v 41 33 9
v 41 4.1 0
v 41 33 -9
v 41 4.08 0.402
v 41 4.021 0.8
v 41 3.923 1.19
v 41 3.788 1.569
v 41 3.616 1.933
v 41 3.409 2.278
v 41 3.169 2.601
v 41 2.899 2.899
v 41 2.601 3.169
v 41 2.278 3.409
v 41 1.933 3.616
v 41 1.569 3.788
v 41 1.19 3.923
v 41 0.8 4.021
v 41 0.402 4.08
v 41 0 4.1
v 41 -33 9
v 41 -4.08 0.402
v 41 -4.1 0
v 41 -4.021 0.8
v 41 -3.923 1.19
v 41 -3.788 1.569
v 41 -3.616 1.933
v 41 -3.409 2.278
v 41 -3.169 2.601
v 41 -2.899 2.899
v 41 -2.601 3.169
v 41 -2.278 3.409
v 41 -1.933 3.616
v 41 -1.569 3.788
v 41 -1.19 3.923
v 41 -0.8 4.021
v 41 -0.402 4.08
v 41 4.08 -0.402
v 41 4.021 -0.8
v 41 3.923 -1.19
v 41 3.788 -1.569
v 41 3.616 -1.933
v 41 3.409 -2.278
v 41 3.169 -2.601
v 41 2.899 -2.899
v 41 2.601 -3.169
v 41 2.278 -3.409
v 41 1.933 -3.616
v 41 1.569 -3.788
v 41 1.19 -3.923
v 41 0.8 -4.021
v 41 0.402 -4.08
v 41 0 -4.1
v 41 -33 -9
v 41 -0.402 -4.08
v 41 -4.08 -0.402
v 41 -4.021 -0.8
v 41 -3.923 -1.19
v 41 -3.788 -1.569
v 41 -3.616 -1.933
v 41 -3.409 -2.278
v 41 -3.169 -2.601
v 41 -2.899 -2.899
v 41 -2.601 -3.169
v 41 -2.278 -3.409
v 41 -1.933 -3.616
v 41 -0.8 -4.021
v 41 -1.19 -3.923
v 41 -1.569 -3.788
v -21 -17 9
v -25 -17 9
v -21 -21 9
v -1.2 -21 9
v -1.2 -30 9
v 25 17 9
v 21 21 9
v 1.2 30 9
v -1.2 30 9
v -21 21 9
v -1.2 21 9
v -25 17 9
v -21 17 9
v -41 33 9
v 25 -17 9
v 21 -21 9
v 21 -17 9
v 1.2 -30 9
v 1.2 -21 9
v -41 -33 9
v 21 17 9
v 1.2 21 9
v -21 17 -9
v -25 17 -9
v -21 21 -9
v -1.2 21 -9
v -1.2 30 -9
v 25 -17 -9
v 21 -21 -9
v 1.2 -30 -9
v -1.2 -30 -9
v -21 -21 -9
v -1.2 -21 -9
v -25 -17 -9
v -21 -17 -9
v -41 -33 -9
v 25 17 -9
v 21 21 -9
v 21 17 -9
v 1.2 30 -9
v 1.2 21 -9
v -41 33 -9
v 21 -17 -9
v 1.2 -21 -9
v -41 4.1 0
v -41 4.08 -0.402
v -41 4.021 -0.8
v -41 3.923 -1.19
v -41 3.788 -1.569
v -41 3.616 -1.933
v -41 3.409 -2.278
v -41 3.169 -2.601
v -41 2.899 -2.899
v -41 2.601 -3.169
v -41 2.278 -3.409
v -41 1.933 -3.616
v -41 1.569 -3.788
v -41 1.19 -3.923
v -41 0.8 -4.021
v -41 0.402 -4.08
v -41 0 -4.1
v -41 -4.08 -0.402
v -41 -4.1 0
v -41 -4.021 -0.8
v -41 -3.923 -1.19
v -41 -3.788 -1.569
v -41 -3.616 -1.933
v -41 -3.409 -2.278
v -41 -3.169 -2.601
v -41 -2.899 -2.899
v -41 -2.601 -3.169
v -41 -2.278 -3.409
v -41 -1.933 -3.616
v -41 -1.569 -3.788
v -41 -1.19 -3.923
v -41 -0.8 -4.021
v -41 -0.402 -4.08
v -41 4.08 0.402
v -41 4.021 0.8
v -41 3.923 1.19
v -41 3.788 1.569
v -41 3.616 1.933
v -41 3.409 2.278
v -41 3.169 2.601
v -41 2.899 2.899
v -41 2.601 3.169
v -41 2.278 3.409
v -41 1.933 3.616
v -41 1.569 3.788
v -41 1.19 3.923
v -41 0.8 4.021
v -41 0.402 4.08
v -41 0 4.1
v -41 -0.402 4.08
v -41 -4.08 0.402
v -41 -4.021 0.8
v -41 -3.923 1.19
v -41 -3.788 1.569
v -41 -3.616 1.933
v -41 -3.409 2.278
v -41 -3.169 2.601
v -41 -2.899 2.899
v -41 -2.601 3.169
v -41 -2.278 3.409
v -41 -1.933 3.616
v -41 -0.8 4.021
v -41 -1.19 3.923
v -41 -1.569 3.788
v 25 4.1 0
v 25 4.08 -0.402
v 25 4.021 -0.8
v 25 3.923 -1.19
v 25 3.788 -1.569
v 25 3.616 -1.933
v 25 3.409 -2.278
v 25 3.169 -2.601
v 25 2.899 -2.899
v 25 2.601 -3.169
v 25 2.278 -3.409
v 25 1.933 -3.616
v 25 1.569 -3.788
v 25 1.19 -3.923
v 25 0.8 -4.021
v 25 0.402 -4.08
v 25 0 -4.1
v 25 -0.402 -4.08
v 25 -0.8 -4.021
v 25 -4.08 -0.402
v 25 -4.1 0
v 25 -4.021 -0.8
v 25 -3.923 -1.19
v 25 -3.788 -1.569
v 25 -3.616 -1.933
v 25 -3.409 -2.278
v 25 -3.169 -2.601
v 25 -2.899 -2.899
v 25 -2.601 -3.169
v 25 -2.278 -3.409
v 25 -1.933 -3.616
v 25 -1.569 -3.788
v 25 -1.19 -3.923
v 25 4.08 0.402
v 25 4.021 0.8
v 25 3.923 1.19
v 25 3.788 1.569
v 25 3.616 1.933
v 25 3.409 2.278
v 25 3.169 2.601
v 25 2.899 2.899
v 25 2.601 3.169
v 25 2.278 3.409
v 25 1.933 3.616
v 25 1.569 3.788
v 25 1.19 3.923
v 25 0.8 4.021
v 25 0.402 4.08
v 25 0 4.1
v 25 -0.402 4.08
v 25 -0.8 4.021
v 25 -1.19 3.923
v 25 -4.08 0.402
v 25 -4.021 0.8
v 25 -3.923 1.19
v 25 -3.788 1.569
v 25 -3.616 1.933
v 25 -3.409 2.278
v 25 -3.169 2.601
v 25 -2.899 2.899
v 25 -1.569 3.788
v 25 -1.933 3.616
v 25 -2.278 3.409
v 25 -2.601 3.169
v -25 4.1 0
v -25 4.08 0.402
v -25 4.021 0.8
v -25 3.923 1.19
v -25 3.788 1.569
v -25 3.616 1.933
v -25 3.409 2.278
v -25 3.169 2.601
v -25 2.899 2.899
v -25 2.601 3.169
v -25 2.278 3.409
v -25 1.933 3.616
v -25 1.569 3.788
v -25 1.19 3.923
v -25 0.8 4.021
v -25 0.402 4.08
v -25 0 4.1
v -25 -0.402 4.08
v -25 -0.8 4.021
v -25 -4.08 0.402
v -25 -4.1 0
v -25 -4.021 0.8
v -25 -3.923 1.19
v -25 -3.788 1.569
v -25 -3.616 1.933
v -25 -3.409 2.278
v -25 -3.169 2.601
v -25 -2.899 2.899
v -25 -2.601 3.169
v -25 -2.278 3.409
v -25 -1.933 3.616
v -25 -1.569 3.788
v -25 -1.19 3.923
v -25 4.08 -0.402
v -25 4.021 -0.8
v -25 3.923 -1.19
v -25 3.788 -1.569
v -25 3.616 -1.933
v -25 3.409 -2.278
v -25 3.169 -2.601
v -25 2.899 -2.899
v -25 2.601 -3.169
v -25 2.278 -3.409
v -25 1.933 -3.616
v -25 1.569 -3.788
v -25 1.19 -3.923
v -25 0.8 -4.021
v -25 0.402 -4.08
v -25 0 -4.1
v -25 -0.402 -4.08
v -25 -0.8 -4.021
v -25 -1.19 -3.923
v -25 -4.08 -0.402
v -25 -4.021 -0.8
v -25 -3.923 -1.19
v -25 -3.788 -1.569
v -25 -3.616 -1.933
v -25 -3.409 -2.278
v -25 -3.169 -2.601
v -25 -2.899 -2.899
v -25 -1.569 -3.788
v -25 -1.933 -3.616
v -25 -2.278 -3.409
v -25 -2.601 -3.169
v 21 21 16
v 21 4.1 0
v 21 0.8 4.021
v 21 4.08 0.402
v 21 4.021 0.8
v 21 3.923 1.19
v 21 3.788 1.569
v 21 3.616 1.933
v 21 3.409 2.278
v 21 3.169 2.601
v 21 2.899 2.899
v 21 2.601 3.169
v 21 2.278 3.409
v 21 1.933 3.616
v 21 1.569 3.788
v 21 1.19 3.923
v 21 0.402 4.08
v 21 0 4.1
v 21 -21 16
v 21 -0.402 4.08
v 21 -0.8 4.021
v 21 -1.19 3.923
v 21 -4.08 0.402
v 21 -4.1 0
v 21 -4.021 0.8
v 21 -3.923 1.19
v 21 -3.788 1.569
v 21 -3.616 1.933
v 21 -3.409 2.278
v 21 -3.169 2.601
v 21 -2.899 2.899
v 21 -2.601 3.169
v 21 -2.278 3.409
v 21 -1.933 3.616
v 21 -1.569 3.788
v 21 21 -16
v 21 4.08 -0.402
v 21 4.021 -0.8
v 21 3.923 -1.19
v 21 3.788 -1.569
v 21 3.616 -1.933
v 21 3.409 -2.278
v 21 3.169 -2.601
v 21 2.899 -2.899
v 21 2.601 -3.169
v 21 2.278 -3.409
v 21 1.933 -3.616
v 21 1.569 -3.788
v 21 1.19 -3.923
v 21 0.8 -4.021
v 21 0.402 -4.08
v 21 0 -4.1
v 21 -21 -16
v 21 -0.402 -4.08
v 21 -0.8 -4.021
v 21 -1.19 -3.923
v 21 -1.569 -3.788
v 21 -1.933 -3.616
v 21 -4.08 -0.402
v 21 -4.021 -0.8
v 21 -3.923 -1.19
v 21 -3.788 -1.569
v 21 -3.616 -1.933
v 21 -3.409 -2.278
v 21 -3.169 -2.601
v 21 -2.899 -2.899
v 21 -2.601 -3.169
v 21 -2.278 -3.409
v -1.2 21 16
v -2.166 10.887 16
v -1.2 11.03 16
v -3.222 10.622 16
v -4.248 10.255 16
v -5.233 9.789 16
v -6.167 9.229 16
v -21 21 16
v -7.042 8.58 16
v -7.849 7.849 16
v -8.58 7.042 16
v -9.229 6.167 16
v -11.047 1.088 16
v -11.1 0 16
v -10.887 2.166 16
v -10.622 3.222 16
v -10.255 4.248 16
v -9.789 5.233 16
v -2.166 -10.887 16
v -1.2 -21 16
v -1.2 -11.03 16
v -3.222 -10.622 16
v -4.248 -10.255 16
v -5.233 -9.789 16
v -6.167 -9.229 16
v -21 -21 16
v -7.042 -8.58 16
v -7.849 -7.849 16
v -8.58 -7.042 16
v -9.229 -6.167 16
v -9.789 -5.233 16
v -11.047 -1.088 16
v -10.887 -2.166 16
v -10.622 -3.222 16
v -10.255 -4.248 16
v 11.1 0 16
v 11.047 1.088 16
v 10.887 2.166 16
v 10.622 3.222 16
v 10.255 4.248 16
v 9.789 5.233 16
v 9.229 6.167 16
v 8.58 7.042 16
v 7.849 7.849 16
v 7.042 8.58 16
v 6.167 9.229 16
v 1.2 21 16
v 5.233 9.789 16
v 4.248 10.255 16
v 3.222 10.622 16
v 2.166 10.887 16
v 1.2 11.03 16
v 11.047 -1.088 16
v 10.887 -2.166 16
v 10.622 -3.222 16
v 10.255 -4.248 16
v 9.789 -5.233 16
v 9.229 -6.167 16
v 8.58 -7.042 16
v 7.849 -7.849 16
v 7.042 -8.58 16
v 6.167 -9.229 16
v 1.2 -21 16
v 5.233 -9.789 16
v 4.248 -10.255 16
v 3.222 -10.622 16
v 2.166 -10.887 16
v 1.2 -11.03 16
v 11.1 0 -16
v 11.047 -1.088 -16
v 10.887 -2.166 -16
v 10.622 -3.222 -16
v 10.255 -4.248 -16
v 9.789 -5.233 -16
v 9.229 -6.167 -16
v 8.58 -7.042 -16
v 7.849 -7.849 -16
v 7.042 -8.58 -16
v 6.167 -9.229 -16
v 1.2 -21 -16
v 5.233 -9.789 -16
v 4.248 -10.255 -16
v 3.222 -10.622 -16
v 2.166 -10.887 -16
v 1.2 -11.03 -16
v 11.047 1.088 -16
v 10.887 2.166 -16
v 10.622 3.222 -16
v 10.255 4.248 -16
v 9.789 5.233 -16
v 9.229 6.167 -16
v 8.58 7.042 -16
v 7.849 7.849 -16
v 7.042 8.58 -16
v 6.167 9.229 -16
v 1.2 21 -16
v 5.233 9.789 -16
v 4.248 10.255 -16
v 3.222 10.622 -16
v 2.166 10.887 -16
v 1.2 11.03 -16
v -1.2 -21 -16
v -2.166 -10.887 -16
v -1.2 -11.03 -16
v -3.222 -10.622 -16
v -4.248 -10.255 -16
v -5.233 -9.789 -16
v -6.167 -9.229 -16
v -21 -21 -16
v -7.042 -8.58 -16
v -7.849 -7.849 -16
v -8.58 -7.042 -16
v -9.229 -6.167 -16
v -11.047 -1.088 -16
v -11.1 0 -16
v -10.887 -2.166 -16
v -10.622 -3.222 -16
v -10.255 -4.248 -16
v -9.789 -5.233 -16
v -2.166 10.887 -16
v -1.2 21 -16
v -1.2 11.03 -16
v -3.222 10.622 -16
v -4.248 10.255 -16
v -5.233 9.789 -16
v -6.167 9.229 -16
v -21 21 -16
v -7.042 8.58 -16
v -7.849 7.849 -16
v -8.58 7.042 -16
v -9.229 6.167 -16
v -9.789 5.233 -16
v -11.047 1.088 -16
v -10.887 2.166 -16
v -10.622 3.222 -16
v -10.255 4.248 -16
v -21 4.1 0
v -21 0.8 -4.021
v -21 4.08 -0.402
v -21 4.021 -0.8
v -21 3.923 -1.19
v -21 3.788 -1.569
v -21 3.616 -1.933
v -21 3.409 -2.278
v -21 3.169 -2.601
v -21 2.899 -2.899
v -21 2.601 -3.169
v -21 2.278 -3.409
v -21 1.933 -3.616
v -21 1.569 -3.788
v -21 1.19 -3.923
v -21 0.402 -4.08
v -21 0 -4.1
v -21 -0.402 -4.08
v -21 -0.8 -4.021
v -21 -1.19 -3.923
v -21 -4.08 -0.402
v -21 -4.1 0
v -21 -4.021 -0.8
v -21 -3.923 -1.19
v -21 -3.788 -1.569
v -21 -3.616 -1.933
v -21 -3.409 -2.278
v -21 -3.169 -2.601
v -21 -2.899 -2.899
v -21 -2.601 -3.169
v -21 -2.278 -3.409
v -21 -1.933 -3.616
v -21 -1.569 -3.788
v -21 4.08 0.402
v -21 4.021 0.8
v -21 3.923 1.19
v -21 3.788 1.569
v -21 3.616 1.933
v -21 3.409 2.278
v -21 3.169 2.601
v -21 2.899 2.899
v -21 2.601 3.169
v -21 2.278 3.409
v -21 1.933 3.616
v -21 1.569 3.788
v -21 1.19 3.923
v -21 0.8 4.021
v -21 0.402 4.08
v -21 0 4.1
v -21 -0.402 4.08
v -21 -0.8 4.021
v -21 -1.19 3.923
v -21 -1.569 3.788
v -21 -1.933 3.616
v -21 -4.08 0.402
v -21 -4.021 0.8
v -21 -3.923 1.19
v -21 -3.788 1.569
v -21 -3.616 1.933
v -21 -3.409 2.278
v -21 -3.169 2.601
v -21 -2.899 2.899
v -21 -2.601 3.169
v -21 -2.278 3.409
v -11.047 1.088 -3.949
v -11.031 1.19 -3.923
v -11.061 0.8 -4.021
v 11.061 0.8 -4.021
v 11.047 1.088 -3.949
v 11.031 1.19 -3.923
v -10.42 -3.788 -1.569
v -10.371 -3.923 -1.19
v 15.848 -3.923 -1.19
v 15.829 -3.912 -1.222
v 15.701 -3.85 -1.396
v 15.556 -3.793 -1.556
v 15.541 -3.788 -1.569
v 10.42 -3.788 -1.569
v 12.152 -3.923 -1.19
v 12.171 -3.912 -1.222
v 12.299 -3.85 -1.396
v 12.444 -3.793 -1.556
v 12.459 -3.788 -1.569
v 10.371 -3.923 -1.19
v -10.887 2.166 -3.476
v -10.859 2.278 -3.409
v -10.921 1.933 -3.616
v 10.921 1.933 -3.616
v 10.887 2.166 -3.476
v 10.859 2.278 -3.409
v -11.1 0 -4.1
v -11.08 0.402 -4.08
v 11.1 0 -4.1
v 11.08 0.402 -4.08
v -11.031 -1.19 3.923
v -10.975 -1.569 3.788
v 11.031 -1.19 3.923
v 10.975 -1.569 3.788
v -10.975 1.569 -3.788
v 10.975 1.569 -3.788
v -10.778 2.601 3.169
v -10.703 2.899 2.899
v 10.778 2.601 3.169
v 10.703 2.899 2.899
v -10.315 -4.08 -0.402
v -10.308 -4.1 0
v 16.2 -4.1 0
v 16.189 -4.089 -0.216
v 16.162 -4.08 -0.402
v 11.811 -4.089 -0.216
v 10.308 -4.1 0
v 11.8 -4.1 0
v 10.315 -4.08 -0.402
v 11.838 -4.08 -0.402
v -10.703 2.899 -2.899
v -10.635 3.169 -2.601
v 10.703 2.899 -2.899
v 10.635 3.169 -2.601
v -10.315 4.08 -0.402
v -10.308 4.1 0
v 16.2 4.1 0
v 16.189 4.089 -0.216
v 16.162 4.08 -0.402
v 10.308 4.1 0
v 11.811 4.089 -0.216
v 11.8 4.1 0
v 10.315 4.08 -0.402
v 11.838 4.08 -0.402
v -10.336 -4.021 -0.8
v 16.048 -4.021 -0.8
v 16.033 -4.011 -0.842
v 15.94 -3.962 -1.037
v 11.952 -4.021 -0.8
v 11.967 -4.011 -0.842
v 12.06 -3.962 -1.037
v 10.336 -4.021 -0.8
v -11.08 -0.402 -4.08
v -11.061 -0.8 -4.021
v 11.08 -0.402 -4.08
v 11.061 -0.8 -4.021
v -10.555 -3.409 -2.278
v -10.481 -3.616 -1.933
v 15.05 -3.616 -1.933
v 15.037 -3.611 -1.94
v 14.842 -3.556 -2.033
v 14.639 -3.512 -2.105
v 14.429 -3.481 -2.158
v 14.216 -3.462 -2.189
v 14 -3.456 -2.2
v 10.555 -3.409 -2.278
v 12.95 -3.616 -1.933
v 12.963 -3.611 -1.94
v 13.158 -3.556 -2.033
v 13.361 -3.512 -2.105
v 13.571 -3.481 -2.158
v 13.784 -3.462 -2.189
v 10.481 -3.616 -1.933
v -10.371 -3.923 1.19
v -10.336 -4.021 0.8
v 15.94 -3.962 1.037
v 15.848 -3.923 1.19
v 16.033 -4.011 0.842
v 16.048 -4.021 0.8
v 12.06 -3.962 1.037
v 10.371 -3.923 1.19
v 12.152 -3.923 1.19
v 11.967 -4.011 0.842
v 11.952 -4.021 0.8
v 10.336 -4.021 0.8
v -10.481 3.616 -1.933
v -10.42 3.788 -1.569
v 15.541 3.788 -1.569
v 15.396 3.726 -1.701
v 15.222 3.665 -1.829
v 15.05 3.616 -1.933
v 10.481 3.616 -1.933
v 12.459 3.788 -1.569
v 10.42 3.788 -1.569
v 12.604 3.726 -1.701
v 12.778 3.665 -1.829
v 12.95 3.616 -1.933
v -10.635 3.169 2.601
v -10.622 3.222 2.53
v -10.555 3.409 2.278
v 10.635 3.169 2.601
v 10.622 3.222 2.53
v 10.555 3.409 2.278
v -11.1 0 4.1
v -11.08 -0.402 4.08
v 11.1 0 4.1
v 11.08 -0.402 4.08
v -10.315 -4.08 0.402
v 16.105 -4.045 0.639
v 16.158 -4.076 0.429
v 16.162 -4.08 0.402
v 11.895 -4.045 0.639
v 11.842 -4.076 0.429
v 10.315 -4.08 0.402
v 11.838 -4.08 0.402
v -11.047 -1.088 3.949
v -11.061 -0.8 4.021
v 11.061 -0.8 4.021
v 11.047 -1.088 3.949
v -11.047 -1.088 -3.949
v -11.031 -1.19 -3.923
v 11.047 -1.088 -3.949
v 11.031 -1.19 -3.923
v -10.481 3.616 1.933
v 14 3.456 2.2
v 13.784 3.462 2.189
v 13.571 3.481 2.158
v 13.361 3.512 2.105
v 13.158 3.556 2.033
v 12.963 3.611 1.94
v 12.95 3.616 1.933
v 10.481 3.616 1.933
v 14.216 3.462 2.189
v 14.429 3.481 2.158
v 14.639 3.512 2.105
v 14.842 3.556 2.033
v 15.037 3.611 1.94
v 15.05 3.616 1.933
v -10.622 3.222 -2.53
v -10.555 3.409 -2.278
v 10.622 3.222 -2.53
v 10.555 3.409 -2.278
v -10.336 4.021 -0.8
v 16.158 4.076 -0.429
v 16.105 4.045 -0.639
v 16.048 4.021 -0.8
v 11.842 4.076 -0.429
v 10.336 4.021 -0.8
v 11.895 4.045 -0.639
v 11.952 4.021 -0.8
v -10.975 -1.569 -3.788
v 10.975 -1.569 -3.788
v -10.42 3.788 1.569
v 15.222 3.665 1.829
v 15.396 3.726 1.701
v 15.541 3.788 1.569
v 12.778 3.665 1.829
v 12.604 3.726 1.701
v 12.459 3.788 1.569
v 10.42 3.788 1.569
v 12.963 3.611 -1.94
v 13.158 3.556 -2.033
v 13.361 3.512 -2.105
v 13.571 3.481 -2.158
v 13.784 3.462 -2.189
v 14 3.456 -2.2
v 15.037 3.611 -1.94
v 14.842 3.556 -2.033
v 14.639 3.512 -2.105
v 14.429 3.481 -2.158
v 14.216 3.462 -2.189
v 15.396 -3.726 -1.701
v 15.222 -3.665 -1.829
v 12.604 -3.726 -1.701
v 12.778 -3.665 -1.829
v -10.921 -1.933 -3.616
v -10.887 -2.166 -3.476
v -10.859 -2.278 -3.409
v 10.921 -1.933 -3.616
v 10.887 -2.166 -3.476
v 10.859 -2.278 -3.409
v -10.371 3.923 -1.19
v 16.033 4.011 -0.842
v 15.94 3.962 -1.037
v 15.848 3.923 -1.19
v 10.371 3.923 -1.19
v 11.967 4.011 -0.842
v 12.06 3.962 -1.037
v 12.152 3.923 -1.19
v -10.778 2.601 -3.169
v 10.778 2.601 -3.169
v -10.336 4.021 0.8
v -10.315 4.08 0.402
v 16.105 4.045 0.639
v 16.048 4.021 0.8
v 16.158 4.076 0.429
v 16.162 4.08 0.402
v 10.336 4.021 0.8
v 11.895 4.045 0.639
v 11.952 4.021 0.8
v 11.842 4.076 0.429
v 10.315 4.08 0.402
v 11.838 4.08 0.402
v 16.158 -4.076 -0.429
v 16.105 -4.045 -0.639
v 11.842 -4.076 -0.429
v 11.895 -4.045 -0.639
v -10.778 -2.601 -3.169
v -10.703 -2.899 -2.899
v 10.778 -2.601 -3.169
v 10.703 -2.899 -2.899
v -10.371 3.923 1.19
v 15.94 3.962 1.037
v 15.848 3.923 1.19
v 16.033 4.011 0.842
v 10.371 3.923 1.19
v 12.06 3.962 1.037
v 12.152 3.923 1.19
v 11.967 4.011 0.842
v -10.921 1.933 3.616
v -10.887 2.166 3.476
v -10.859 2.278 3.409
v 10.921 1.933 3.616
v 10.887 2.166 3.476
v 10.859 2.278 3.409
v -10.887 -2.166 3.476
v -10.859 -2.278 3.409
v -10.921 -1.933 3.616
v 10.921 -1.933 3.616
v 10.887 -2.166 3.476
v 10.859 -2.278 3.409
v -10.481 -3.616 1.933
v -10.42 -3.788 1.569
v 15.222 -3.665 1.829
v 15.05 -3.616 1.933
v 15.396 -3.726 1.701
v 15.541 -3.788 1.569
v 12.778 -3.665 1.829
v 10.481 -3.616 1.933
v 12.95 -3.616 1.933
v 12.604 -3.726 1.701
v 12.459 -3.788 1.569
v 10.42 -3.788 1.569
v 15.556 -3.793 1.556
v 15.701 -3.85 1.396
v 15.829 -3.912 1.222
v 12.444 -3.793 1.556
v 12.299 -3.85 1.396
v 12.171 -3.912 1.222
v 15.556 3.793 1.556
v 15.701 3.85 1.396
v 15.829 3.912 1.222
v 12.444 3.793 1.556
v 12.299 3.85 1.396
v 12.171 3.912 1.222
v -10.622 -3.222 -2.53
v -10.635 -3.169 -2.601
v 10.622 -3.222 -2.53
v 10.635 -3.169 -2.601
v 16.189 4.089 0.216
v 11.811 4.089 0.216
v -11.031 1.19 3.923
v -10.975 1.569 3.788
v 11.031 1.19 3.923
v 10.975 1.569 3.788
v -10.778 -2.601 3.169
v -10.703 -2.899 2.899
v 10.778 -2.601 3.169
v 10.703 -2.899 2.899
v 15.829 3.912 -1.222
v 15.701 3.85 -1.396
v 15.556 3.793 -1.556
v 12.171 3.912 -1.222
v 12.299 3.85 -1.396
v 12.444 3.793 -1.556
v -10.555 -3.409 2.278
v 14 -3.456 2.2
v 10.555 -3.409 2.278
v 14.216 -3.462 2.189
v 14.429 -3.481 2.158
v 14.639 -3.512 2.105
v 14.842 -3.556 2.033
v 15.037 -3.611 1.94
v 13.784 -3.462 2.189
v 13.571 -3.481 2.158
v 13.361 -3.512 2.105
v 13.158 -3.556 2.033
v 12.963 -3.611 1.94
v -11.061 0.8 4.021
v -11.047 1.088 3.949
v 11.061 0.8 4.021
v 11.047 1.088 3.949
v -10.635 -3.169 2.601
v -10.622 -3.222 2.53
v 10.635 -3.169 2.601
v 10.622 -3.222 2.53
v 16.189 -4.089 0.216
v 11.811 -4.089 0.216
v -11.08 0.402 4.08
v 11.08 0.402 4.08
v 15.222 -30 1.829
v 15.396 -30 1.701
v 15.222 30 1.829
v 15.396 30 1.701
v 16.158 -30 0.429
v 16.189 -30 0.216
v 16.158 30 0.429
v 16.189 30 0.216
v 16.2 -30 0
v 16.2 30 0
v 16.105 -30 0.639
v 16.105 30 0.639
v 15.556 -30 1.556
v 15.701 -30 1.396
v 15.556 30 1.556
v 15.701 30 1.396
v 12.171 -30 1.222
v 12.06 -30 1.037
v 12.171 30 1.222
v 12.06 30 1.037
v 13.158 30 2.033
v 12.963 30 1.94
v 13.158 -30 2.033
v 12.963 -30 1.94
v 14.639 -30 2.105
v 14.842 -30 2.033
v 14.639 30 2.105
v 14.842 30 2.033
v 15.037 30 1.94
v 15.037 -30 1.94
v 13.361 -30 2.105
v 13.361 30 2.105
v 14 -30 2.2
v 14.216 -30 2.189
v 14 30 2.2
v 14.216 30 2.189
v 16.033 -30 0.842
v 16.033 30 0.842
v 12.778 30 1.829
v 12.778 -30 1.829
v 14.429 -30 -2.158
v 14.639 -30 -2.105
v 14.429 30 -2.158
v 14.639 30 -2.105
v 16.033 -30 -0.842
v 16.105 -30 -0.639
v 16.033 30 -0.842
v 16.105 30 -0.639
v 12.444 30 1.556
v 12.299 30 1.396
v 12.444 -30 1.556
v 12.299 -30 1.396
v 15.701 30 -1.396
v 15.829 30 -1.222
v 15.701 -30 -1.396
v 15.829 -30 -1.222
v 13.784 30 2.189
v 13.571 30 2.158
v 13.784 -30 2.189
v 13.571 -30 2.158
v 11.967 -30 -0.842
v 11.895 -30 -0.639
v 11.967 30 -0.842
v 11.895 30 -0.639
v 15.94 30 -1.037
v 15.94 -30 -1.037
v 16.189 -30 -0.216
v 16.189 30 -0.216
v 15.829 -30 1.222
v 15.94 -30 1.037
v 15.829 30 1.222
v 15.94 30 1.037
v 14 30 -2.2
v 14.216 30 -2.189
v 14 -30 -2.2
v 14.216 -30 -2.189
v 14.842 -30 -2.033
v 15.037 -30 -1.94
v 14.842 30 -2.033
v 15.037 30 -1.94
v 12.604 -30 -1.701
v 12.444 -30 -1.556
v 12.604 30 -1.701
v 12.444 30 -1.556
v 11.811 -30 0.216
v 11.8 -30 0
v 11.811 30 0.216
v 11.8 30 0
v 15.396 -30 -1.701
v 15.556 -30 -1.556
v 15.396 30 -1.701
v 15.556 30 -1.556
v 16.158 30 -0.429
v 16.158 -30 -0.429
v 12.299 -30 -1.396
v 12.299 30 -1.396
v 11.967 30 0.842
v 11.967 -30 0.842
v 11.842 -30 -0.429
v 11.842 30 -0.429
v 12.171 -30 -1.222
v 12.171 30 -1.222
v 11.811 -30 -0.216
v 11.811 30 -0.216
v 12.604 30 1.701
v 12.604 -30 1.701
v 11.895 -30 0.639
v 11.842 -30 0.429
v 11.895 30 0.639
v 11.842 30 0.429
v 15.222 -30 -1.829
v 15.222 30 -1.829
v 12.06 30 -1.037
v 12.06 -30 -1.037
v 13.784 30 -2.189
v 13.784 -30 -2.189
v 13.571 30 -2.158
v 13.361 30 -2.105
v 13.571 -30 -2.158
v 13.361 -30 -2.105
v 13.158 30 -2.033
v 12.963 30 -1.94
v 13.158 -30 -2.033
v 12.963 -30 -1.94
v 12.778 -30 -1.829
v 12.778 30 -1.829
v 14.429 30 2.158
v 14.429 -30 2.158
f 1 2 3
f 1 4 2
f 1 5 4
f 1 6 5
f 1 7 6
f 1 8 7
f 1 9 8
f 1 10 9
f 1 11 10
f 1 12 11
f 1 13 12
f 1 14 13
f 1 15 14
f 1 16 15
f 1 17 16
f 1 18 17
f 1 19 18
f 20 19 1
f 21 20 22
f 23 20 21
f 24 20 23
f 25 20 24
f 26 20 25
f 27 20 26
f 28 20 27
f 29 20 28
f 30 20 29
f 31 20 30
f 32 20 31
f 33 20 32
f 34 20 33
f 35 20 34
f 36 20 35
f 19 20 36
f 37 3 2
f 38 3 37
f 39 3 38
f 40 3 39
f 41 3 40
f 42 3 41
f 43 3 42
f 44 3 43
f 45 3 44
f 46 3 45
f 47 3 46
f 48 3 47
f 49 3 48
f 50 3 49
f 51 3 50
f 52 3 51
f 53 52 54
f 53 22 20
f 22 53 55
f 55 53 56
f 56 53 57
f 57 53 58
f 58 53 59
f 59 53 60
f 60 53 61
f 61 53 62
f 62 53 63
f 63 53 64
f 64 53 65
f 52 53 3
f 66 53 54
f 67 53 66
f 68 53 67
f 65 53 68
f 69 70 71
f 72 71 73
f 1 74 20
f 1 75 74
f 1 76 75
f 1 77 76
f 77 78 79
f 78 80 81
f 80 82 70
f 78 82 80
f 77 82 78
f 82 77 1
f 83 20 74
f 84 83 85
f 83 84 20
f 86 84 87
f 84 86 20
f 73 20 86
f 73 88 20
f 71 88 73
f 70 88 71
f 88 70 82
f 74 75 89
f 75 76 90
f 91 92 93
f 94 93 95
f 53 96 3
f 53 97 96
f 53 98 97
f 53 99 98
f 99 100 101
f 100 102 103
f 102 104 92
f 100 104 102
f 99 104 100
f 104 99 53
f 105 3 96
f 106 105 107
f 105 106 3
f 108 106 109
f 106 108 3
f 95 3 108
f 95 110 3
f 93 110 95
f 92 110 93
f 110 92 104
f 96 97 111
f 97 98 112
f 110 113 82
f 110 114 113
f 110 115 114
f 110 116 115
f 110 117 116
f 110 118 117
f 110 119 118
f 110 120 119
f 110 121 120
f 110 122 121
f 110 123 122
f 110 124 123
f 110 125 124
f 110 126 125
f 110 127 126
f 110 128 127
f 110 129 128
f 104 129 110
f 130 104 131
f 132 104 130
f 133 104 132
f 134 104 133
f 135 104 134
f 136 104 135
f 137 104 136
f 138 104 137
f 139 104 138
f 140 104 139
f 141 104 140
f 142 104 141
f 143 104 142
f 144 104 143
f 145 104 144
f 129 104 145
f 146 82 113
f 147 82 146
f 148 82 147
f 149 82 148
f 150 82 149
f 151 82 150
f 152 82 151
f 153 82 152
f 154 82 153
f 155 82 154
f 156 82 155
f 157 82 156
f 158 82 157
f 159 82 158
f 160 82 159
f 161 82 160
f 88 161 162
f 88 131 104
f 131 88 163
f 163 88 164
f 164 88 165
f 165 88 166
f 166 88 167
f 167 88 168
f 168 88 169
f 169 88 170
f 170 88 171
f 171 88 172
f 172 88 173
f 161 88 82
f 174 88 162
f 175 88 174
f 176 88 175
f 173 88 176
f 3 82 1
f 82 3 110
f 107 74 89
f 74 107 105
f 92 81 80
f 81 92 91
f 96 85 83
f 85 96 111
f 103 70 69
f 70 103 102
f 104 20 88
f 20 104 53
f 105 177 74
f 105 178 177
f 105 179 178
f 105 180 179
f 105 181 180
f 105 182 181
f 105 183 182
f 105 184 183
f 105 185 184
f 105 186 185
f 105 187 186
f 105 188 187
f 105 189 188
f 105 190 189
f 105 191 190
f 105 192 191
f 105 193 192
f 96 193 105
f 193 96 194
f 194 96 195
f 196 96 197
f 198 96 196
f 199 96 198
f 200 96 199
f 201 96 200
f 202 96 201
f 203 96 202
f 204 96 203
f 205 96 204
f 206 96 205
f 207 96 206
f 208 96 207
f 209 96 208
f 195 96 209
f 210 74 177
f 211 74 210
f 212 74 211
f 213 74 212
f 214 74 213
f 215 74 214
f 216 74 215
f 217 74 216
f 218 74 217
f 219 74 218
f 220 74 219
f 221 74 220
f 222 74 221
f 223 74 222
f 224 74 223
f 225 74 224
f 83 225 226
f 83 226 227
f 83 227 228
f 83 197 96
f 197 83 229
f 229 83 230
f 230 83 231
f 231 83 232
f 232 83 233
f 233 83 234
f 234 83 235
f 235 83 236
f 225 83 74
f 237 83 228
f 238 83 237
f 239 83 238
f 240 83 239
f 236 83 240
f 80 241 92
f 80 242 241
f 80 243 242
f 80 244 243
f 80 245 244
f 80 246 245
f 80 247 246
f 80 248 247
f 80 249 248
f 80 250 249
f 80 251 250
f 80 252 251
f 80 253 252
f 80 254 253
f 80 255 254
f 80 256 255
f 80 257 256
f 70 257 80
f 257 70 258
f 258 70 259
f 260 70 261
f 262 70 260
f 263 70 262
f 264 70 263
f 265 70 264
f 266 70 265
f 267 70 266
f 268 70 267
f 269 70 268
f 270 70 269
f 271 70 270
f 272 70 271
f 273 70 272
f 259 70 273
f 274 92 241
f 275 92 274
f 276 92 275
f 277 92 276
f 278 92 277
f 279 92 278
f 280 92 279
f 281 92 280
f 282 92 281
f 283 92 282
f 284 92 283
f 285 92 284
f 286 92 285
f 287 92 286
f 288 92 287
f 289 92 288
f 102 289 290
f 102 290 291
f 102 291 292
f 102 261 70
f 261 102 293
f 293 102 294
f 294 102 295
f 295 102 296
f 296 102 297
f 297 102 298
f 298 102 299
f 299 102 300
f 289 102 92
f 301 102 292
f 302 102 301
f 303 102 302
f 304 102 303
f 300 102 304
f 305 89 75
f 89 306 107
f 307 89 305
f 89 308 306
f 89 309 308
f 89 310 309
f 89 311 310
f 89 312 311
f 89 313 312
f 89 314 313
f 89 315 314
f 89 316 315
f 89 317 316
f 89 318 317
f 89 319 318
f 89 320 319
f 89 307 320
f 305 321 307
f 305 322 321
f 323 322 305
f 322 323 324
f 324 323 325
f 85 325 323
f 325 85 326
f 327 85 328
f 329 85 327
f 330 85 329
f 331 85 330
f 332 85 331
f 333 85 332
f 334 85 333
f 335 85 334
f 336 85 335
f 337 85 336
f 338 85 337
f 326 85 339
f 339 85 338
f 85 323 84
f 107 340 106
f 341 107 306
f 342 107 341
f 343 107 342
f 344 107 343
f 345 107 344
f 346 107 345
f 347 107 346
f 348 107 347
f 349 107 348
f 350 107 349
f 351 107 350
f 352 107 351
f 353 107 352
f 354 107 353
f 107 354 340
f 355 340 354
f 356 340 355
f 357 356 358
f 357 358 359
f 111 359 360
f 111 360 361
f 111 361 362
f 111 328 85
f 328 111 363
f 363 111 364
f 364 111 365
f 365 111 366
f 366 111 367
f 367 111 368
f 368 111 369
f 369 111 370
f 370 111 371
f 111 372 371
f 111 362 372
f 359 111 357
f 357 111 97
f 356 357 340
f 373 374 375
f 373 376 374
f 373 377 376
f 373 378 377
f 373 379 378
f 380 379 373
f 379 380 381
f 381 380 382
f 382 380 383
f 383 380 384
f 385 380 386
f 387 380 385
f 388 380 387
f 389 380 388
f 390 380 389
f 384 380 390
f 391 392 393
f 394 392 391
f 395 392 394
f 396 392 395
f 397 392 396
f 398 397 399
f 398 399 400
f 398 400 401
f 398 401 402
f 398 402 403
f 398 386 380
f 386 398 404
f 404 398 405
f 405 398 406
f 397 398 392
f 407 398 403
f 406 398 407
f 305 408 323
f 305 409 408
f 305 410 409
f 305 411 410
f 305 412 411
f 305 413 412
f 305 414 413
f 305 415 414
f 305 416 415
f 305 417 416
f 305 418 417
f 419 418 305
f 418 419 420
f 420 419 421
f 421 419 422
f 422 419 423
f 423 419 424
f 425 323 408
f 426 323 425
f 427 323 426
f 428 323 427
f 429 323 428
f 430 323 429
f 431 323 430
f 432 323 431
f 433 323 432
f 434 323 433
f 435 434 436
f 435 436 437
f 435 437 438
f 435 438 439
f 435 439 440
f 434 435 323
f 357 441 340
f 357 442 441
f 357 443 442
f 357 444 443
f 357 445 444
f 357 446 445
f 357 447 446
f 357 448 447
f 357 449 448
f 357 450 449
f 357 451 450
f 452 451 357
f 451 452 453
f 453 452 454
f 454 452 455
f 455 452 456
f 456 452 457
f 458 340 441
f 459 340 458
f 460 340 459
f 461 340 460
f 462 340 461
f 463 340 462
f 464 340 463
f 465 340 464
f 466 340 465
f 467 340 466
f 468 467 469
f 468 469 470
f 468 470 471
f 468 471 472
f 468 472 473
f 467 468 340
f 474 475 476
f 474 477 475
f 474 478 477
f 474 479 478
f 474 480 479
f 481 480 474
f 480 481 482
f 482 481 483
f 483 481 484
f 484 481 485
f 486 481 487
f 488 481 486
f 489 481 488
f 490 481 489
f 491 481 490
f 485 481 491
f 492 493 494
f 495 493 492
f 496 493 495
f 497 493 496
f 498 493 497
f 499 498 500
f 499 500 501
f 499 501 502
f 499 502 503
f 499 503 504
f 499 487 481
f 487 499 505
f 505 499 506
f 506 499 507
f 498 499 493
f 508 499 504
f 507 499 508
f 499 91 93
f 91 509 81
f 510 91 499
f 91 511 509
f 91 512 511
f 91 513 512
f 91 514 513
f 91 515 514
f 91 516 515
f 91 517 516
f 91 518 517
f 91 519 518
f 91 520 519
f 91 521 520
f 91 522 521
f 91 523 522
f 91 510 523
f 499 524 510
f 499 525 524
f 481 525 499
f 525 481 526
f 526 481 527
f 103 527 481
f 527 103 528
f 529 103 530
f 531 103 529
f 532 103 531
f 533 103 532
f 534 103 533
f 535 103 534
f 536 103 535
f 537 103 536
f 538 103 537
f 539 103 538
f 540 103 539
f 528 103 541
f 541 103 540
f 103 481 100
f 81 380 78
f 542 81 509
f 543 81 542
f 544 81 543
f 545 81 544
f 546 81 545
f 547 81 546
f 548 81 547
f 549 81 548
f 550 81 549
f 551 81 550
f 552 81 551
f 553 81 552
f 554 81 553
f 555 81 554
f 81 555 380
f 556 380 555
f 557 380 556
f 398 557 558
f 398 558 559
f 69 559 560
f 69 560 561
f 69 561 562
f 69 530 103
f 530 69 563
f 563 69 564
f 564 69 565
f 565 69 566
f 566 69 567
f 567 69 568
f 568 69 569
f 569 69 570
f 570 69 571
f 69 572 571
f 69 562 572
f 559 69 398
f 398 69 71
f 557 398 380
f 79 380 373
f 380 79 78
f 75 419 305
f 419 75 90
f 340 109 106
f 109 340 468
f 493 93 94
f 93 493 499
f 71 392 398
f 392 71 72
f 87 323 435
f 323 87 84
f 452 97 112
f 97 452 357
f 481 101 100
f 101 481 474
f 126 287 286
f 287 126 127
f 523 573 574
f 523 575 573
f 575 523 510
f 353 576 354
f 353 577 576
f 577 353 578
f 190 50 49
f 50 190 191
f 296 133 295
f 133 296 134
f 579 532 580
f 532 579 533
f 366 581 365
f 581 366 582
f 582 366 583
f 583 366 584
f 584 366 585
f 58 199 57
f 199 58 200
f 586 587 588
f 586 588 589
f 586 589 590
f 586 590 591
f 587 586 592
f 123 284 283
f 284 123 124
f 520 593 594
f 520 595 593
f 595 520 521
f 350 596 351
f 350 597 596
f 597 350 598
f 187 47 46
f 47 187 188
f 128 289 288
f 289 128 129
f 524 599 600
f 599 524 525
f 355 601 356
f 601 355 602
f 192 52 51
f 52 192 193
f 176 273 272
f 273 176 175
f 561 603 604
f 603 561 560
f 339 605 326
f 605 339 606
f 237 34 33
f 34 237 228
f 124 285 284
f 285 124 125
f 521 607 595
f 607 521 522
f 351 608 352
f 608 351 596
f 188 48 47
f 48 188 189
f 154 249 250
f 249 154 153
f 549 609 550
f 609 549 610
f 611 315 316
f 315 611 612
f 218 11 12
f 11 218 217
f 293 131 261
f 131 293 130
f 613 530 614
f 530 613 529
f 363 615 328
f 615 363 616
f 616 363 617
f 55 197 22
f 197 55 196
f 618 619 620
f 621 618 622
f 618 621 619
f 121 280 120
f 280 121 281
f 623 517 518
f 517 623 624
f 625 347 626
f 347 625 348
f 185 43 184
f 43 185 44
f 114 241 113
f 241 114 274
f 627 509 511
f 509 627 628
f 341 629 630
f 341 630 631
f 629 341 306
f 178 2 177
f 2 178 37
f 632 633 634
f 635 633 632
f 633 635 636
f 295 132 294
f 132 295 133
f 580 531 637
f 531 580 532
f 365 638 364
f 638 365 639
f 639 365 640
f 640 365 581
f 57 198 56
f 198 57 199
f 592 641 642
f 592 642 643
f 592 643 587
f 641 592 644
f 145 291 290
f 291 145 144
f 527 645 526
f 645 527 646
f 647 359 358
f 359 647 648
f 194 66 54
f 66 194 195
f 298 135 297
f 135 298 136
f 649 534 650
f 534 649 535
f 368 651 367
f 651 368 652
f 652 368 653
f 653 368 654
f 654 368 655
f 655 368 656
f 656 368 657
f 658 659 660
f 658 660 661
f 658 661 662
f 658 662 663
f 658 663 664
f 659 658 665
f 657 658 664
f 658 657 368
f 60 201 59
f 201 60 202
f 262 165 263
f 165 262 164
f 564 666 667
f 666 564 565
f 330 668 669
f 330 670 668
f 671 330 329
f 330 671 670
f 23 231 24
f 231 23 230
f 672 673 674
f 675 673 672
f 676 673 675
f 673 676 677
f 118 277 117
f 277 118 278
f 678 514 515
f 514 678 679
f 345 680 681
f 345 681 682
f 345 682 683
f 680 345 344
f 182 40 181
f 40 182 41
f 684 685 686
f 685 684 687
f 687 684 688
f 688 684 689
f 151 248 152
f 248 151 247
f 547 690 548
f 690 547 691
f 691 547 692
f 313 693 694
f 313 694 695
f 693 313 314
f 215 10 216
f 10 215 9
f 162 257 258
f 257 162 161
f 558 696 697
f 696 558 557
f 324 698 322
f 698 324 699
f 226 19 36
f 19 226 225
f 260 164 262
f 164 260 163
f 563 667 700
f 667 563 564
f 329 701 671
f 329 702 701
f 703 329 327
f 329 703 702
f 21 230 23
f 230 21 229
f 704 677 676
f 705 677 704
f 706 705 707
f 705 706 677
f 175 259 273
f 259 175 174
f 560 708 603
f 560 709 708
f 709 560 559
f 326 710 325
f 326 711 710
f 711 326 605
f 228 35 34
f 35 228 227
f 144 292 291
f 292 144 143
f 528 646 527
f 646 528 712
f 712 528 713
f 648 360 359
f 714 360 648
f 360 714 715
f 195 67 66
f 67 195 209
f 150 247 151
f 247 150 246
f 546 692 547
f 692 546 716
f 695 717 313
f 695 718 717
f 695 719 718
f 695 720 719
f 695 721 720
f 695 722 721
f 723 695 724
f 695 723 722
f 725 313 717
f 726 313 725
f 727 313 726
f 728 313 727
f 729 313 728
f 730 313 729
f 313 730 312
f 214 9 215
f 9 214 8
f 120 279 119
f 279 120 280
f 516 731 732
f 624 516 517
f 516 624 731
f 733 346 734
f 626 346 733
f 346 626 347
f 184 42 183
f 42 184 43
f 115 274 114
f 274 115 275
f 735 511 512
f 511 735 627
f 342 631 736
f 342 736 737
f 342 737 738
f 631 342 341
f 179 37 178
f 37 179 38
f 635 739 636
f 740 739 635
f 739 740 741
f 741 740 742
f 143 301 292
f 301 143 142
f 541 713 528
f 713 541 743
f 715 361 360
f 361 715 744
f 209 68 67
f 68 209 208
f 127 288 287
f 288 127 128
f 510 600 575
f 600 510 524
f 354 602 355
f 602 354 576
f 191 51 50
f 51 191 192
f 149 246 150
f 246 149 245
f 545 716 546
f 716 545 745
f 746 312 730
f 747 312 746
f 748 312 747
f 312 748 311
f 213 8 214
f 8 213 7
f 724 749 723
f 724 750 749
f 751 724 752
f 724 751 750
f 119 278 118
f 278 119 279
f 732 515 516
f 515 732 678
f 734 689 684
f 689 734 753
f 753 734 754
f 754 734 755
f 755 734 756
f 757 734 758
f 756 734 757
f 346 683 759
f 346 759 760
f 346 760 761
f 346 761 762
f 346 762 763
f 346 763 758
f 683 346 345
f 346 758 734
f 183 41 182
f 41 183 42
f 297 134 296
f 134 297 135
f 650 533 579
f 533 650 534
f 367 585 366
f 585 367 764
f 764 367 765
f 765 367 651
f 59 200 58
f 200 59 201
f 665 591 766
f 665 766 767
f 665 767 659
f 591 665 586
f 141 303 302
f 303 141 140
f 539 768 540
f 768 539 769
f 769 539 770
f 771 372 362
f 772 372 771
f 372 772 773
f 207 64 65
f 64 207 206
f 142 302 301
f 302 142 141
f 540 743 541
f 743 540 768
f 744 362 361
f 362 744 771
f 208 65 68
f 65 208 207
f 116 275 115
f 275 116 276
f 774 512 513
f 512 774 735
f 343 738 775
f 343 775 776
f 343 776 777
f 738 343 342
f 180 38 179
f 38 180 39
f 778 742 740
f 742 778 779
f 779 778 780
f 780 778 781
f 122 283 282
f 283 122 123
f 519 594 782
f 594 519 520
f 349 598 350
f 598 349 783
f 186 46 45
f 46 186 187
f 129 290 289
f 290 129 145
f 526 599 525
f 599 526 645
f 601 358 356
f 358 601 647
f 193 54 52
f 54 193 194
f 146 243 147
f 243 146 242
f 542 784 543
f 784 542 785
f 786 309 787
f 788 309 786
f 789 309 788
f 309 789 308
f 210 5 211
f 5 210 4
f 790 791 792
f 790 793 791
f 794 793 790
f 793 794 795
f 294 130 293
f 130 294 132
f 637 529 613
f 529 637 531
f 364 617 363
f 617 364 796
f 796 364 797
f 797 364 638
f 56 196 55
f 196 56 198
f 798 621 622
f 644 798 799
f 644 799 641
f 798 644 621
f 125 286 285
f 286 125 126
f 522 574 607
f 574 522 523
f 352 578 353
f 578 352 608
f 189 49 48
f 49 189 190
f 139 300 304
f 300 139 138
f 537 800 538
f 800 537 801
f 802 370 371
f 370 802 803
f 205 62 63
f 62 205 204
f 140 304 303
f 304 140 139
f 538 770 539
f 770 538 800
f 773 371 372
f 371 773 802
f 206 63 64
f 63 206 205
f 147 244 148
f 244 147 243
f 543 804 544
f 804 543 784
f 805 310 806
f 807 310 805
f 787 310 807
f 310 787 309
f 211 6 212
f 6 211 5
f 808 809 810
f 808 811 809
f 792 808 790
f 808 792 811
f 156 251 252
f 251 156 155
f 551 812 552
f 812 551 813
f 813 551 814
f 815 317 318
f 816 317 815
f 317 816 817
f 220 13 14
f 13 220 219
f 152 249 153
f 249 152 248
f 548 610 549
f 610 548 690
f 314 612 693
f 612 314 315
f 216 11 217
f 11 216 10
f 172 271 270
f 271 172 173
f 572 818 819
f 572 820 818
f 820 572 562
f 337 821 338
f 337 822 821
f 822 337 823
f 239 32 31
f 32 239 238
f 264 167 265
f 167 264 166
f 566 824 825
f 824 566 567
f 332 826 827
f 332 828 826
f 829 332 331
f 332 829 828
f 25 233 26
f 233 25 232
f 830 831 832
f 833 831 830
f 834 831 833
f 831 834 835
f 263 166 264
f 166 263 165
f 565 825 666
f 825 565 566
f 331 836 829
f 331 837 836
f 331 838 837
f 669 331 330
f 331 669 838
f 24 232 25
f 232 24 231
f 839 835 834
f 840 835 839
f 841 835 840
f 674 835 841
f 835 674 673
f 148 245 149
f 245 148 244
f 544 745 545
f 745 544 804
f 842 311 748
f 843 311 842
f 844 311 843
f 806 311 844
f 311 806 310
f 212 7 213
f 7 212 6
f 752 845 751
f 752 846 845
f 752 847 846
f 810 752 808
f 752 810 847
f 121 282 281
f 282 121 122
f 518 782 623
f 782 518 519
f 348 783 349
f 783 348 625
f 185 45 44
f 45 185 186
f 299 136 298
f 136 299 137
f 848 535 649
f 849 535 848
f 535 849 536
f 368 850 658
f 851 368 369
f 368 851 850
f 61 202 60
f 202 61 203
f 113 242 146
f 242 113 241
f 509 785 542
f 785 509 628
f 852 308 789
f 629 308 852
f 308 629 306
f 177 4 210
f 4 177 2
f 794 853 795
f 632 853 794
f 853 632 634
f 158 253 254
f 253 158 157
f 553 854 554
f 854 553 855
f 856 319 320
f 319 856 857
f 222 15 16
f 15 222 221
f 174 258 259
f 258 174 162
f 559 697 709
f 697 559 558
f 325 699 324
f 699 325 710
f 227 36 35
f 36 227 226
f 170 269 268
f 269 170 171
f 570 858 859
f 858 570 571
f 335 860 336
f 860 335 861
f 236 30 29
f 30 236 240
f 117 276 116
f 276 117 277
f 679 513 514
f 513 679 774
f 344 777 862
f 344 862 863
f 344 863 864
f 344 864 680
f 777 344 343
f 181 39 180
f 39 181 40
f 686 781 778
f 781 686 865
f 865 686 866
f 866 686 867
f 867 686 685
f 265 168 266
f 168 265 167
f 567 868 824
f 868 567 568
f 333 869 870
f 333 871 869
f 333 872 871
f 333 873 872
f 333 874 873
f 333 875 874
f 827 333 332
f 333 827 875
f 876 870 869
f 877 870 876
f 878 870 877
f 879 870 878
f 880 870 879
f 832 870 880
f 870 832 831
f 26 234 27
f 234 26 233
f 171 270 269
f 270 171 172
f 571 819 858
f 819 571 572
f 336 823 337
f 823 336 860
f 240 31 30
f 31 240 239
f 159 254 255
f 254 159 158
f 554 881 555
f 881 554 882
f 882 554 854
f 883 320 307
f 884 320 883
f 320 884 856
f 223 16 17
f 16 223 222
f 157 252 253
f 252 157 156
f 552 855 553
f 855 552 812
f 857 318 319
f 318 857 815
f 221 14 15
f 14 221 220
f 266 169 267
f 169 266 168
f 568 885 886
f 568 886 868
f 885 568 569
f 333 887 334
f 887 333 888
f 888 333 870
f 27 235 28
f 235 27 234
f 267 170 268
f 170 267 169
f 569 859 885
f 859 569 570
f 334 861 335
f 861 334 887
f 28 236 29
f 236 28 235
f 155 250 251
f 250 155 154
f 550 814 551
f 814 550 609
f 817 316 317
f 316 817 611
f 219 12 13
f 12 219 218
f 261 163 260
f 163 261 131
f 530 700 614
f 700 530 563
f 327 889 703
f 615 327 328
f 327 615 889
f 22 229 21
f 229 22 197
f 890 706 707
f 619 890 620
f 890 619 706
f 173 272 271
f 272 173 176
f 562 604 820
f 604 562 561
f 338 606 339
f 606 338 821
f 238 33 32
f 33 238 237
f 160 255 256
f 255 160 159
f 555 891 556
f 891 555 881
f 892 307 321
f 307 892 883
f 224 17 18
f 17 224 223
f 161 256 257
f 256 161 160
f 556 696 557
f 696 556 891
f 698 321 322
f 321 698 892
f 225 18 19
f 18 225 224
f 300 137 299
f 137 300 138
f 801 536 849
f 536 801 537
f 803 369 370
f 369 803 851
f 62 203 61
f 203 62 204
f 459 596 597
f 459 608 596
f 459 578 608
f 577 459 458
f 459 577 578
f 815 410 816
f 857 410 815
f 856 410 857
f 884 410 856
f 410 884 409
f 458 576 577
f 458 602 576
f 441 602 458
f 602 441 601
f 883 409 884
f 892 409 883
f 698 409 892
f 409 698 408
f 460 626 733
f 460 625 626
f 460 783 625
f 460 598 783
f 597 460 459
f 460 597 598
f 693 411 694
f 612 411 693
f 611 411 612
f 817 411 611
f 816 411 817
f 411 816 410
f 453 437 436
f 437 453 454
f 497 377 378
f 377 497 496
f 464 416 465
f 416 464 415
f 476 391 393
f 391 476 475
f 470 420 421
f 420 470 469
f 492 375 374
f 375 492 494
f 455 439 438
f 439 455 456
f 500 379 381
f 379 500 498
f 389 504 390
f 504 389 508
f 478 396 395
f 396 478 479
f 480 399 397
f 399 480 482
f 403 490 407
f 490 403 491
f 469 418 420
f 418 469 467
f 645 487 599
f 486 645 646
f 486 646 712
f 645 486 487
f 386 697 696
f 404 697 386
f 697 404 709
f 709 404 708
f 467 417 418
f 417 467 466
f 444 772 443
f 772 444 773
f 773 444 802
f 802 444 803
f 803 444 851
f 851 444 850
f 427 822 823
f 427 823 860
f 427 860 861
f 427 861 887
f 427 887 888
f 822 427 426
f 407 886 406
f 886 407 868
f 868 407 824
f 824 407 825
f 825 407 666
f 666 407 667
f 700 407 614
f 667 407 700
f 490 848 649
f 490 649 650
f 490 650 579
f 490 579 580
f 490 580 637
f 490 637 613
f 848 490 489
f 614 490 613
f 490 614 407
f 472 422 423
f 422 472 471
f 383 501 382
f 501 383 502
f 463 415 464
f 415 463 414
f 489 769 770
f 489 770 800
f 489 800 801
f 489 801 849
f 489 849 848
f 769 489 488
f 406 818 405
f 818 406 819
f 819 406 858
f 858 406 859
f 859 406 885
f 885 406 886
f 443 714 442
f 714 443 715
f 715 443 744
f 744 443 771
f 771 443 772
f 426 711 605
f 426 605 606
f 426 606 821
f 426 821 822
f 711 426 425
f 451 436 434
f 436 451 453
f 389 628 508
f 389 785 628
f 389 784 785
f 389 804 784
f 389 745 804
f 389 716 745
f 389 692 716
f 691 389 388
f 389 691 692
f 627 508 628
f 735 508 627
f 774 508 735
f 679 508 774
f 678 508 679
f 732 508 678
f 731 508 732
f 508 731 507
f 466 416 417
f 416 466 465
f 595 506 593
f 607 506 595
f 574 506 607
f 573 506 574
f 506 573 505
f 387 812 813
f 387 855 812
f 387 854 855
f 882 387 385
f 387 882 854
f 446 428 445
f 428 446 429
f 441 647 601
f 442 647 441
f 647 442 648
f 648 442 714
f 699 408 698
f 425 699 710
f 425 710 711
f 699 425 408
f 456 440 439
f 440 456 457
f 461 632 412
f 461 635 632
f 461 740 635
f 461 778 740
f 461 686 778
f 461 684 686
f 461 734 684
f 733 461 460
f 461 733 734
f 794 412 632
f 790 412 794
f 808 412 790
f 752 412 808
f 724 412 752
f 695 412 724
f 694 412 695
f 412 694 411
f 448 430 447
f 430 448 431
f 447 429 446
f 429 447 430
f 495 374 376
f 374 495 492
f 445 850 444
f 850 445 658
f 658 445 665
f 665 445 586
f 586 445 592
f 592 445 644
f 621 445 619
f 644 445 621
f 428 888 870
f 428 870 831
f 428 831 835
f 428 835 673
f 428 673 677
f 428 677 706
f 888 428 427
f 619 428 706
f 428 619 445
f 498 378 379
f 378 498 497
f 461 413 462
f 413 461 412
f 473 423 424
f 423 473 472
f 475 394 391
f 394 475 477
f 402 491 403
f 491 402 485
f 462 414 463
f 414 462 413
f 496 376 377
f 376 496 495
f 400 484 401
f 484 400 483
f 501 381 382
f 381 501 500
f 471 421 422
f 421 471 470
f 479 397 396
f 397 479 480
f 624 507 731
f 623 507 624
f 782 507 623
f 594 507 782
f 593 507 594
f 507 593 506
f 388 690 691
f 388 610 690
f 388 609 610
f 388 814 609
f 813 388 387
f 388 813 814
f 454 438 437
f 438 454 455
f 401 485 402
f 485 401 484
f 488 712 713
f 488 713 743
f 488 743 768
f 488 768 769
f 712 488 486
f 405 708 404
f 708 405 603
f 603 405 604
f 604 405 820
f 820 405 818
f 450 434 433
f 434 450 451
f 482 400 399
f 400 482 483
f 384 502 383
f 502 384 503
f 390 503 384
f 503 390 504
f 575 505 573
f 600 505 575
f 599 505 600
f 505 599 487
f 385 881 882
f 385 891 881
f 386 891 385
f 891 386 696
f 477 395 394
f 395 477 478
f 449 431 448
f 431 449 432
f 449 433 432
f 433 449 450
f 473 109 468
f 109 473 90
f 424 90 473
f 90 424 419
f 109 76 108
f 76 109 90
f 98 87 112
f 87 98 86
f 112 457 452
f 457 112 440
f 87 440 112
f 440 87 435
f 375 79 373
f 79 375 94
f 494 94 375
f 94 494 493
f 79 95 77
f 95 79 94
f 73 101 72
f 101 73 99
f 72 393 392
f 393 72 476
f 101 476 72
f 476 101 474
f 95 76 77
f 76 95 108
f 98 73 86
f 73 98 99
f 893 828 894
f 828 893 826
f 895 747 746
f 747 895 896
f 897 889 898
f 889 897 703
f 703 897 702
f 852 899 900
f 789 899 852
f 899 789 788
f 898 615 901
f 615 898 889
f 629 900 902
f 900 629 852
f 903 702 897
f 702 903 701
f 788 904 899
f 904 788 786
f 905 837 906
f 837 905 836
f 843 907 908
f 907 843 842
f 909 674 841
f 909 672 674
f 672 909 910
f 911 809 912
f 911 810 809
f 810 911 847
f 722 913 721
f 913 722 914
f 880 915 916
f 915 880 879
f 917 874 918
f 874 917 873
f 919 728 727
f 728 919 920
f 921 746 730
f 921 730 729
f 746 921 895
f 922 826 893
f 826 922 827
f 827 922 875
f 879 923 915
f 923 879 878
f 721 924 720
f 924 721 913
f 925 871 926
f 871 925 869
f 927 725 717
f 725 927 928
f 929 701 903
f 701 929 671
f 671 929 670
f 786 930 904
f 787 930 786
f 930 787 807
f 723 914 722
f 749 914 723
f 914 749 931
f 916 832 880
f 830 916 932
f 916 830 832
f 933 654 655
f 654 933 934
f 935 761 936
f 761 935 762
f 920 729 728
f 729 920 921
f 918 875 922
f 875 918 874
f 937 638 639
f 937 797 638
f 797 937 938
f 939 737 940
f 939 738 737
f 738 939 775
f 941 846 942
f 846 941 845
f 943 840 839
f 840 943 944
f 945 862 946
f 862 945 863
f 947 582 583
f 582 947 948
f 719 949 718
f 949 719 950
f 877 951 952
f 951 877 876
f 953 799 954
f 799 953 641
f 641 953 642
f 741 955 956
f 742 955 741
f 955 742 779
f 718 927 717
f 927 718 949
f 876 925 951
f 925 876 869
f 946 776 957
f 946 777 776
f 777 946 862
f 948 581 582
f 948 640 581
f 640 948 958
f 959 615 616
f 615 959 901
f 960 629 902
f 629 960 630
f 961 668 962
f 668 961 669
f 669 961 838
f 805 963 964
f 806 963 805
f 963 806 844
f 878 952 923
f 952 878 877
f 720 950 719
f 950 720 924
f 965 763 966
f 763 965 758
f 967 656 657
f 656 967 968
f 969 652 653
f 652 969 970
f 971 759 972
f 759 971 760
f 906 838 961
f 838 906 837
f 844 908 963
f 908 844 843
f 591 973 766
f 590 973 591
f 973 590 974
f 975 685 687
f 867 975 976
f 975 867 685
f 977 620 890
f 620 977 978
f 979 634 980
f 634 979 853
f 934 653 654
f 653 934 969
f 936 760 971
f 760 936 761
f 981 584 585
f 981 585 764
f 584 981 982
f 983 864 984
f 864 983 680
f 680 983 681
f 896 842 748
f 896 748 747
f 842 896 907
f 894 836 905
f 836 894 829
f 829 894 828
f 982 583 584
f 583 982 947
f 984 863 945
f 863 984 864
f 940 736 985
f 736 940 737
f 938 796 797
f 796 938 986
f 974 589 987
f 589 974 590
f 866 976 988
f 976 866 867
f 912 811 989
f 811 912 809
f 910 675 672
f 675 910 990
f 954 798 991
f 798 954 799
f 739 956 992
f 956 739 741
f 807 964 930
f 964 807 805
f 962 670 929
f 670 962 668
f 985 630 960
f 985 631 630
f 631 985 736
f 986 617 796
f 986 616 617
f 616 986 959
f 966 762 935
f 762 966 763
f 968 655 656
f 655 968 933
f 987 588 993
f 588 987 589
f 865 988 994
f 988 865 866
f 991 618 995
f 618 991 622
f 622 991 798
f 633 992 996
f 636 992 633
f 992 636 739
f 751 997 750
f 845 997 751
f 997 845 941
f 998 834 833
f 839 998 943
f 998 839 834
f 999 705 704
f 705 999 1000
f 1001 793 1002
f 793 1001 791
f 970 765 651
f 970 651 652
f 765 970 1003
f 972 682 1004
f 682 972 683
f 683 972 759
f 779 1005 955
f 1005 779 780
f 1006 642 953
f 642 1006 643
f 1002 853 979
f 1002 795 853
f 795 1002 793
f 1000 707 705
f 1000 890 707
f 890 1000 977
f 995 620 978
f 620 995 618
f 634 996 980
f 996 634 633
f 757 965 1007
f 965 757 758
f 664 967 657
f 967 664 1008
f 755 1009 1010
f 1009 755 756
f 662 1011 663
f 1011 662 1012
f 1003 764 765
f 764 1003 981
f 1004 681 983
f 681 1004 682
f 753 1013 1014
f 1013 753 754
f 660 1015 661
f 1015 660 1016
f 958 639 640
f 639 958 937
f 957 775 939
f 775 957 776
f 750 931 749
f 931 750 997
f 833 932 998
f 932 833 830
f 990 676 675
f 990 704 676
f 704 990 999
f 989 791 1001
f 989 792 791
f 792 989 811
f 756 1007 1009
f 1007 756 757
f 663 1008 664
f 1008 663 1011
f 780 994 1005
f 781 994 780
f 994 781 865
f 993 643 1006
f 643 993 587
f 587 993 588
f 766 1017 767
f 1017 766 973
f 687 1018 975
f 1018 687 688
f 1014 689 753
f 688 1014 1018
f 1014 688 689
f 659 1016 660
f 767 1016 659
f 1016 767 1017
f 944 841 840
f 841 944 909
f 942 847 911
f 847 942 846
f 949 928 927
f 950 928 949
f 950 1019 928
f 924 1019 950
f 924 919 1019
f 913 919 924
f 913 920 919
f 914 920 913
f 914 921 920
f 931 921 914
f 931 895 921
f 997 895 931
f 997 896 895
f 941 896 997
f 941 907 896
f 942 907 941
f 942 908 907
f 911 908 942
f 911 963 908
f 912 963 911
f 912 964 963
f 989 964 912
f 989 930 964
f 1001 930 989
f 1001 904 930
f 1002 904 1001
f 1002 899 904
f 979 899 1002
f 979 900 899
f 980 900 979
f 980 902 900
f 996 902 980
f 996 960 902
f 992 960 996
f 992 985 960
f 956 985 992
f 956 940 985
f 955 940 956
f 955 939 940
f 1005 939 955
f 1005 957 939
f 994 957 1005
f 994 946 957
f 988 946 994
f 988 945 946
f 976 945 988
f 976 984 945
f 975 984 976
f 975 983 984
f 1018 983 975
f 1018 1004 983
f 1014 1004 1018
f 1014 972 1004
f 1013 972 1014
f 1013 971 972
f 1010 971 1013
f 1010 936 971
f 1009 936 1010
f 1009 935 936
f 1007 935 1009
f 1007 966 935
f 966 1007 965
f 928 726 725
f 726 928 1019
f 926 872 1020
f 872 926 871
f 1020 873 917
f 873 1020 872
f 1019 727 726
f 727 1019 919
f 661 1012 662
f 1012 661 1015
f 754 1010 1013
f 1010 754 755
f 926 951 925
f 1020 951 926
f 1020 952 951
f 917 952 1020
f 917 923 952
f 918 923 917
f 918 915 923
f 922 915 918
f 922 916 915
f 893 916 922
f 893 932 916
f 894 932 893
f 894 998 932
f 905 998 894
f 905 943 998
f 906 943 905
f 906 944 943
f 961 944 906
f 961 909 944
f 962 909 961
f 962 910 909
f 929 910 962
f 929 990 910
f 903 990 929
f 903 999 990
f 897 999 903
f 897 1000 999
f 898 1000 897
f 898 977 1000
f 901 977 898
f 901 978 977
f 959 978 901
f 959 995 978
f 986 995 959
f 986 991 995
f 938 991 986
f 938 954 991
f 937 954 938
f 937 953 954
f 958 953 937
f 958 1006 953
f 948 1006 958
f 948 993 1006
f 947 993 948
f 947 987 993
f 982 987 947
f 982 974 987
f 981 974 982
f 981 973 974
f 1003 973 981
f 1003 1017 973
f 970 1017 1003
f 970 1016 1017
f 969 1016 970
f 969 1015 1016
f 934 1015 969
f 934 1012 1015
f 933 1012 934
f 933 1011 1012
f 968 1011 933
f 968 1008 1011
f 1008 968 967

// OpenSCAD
// file: parameters.scad
// 135er Universal Helicopter Controller - Cyclic V1 parameters
$fn = 64;

base_x = 220;
base_y = 180;
base_h = 18;
wall = 5;

shaft_d = 8.2;
bearing_od = 22.2;
bearing_w = 7.2;

gimbal_outer_x = 120;
gimbal_outer_y = 100;
gimbal_bar = 18;
gimbal_h = 18;

tube_od = 22.2;
tube_clamp_wall = 6;

sensor_board_x = 23;
sensor_board_y = 23;
sensor_gap = 2.0;

m4_clearance = 4.4;
m3_clearance = 3.4;
// main file
include <parameters.scad>;

inner_x = 82;
inner_y = 66;
bar = 16;

module bx(len){ cube([len,bar,gimbal_h],center=true); }
module by(len){ cube([bar,len,gimbal_h],center=true); }

difference(){
    union(){
        translate([0,(inner_y-bar)/2,0]) bx(inner_x);
        translate([0,-(inner_y-bar)/2,0]) bx(inner_x);
        translate([(inner_x-bar)/2,0,0]) by(inner_y);
        translate([-(inner_x-bar)/2,0,0]) by(inner_y);

        // Central split-clamp block.
        cube([42,42,32],center=true);
    }

    // Pitch shaft.
    rotate([0,90,0])
        cylinder(h=inner_x+30,d=shaft_d,center=true);

    // Cyclic tube receiver.
    translate([0,0,-20])
        cylinder(h=60,d=tube_od,center=false);

    // Clamp split.
    translate([-1.2,-30,-30])
        cube([2.4,60,70]);

    // Clamp bolt.
    rotate([90,0,0])
        translate([14,0,0])
            cylinder(h=60,d=m4_clearance,center=true);
}
